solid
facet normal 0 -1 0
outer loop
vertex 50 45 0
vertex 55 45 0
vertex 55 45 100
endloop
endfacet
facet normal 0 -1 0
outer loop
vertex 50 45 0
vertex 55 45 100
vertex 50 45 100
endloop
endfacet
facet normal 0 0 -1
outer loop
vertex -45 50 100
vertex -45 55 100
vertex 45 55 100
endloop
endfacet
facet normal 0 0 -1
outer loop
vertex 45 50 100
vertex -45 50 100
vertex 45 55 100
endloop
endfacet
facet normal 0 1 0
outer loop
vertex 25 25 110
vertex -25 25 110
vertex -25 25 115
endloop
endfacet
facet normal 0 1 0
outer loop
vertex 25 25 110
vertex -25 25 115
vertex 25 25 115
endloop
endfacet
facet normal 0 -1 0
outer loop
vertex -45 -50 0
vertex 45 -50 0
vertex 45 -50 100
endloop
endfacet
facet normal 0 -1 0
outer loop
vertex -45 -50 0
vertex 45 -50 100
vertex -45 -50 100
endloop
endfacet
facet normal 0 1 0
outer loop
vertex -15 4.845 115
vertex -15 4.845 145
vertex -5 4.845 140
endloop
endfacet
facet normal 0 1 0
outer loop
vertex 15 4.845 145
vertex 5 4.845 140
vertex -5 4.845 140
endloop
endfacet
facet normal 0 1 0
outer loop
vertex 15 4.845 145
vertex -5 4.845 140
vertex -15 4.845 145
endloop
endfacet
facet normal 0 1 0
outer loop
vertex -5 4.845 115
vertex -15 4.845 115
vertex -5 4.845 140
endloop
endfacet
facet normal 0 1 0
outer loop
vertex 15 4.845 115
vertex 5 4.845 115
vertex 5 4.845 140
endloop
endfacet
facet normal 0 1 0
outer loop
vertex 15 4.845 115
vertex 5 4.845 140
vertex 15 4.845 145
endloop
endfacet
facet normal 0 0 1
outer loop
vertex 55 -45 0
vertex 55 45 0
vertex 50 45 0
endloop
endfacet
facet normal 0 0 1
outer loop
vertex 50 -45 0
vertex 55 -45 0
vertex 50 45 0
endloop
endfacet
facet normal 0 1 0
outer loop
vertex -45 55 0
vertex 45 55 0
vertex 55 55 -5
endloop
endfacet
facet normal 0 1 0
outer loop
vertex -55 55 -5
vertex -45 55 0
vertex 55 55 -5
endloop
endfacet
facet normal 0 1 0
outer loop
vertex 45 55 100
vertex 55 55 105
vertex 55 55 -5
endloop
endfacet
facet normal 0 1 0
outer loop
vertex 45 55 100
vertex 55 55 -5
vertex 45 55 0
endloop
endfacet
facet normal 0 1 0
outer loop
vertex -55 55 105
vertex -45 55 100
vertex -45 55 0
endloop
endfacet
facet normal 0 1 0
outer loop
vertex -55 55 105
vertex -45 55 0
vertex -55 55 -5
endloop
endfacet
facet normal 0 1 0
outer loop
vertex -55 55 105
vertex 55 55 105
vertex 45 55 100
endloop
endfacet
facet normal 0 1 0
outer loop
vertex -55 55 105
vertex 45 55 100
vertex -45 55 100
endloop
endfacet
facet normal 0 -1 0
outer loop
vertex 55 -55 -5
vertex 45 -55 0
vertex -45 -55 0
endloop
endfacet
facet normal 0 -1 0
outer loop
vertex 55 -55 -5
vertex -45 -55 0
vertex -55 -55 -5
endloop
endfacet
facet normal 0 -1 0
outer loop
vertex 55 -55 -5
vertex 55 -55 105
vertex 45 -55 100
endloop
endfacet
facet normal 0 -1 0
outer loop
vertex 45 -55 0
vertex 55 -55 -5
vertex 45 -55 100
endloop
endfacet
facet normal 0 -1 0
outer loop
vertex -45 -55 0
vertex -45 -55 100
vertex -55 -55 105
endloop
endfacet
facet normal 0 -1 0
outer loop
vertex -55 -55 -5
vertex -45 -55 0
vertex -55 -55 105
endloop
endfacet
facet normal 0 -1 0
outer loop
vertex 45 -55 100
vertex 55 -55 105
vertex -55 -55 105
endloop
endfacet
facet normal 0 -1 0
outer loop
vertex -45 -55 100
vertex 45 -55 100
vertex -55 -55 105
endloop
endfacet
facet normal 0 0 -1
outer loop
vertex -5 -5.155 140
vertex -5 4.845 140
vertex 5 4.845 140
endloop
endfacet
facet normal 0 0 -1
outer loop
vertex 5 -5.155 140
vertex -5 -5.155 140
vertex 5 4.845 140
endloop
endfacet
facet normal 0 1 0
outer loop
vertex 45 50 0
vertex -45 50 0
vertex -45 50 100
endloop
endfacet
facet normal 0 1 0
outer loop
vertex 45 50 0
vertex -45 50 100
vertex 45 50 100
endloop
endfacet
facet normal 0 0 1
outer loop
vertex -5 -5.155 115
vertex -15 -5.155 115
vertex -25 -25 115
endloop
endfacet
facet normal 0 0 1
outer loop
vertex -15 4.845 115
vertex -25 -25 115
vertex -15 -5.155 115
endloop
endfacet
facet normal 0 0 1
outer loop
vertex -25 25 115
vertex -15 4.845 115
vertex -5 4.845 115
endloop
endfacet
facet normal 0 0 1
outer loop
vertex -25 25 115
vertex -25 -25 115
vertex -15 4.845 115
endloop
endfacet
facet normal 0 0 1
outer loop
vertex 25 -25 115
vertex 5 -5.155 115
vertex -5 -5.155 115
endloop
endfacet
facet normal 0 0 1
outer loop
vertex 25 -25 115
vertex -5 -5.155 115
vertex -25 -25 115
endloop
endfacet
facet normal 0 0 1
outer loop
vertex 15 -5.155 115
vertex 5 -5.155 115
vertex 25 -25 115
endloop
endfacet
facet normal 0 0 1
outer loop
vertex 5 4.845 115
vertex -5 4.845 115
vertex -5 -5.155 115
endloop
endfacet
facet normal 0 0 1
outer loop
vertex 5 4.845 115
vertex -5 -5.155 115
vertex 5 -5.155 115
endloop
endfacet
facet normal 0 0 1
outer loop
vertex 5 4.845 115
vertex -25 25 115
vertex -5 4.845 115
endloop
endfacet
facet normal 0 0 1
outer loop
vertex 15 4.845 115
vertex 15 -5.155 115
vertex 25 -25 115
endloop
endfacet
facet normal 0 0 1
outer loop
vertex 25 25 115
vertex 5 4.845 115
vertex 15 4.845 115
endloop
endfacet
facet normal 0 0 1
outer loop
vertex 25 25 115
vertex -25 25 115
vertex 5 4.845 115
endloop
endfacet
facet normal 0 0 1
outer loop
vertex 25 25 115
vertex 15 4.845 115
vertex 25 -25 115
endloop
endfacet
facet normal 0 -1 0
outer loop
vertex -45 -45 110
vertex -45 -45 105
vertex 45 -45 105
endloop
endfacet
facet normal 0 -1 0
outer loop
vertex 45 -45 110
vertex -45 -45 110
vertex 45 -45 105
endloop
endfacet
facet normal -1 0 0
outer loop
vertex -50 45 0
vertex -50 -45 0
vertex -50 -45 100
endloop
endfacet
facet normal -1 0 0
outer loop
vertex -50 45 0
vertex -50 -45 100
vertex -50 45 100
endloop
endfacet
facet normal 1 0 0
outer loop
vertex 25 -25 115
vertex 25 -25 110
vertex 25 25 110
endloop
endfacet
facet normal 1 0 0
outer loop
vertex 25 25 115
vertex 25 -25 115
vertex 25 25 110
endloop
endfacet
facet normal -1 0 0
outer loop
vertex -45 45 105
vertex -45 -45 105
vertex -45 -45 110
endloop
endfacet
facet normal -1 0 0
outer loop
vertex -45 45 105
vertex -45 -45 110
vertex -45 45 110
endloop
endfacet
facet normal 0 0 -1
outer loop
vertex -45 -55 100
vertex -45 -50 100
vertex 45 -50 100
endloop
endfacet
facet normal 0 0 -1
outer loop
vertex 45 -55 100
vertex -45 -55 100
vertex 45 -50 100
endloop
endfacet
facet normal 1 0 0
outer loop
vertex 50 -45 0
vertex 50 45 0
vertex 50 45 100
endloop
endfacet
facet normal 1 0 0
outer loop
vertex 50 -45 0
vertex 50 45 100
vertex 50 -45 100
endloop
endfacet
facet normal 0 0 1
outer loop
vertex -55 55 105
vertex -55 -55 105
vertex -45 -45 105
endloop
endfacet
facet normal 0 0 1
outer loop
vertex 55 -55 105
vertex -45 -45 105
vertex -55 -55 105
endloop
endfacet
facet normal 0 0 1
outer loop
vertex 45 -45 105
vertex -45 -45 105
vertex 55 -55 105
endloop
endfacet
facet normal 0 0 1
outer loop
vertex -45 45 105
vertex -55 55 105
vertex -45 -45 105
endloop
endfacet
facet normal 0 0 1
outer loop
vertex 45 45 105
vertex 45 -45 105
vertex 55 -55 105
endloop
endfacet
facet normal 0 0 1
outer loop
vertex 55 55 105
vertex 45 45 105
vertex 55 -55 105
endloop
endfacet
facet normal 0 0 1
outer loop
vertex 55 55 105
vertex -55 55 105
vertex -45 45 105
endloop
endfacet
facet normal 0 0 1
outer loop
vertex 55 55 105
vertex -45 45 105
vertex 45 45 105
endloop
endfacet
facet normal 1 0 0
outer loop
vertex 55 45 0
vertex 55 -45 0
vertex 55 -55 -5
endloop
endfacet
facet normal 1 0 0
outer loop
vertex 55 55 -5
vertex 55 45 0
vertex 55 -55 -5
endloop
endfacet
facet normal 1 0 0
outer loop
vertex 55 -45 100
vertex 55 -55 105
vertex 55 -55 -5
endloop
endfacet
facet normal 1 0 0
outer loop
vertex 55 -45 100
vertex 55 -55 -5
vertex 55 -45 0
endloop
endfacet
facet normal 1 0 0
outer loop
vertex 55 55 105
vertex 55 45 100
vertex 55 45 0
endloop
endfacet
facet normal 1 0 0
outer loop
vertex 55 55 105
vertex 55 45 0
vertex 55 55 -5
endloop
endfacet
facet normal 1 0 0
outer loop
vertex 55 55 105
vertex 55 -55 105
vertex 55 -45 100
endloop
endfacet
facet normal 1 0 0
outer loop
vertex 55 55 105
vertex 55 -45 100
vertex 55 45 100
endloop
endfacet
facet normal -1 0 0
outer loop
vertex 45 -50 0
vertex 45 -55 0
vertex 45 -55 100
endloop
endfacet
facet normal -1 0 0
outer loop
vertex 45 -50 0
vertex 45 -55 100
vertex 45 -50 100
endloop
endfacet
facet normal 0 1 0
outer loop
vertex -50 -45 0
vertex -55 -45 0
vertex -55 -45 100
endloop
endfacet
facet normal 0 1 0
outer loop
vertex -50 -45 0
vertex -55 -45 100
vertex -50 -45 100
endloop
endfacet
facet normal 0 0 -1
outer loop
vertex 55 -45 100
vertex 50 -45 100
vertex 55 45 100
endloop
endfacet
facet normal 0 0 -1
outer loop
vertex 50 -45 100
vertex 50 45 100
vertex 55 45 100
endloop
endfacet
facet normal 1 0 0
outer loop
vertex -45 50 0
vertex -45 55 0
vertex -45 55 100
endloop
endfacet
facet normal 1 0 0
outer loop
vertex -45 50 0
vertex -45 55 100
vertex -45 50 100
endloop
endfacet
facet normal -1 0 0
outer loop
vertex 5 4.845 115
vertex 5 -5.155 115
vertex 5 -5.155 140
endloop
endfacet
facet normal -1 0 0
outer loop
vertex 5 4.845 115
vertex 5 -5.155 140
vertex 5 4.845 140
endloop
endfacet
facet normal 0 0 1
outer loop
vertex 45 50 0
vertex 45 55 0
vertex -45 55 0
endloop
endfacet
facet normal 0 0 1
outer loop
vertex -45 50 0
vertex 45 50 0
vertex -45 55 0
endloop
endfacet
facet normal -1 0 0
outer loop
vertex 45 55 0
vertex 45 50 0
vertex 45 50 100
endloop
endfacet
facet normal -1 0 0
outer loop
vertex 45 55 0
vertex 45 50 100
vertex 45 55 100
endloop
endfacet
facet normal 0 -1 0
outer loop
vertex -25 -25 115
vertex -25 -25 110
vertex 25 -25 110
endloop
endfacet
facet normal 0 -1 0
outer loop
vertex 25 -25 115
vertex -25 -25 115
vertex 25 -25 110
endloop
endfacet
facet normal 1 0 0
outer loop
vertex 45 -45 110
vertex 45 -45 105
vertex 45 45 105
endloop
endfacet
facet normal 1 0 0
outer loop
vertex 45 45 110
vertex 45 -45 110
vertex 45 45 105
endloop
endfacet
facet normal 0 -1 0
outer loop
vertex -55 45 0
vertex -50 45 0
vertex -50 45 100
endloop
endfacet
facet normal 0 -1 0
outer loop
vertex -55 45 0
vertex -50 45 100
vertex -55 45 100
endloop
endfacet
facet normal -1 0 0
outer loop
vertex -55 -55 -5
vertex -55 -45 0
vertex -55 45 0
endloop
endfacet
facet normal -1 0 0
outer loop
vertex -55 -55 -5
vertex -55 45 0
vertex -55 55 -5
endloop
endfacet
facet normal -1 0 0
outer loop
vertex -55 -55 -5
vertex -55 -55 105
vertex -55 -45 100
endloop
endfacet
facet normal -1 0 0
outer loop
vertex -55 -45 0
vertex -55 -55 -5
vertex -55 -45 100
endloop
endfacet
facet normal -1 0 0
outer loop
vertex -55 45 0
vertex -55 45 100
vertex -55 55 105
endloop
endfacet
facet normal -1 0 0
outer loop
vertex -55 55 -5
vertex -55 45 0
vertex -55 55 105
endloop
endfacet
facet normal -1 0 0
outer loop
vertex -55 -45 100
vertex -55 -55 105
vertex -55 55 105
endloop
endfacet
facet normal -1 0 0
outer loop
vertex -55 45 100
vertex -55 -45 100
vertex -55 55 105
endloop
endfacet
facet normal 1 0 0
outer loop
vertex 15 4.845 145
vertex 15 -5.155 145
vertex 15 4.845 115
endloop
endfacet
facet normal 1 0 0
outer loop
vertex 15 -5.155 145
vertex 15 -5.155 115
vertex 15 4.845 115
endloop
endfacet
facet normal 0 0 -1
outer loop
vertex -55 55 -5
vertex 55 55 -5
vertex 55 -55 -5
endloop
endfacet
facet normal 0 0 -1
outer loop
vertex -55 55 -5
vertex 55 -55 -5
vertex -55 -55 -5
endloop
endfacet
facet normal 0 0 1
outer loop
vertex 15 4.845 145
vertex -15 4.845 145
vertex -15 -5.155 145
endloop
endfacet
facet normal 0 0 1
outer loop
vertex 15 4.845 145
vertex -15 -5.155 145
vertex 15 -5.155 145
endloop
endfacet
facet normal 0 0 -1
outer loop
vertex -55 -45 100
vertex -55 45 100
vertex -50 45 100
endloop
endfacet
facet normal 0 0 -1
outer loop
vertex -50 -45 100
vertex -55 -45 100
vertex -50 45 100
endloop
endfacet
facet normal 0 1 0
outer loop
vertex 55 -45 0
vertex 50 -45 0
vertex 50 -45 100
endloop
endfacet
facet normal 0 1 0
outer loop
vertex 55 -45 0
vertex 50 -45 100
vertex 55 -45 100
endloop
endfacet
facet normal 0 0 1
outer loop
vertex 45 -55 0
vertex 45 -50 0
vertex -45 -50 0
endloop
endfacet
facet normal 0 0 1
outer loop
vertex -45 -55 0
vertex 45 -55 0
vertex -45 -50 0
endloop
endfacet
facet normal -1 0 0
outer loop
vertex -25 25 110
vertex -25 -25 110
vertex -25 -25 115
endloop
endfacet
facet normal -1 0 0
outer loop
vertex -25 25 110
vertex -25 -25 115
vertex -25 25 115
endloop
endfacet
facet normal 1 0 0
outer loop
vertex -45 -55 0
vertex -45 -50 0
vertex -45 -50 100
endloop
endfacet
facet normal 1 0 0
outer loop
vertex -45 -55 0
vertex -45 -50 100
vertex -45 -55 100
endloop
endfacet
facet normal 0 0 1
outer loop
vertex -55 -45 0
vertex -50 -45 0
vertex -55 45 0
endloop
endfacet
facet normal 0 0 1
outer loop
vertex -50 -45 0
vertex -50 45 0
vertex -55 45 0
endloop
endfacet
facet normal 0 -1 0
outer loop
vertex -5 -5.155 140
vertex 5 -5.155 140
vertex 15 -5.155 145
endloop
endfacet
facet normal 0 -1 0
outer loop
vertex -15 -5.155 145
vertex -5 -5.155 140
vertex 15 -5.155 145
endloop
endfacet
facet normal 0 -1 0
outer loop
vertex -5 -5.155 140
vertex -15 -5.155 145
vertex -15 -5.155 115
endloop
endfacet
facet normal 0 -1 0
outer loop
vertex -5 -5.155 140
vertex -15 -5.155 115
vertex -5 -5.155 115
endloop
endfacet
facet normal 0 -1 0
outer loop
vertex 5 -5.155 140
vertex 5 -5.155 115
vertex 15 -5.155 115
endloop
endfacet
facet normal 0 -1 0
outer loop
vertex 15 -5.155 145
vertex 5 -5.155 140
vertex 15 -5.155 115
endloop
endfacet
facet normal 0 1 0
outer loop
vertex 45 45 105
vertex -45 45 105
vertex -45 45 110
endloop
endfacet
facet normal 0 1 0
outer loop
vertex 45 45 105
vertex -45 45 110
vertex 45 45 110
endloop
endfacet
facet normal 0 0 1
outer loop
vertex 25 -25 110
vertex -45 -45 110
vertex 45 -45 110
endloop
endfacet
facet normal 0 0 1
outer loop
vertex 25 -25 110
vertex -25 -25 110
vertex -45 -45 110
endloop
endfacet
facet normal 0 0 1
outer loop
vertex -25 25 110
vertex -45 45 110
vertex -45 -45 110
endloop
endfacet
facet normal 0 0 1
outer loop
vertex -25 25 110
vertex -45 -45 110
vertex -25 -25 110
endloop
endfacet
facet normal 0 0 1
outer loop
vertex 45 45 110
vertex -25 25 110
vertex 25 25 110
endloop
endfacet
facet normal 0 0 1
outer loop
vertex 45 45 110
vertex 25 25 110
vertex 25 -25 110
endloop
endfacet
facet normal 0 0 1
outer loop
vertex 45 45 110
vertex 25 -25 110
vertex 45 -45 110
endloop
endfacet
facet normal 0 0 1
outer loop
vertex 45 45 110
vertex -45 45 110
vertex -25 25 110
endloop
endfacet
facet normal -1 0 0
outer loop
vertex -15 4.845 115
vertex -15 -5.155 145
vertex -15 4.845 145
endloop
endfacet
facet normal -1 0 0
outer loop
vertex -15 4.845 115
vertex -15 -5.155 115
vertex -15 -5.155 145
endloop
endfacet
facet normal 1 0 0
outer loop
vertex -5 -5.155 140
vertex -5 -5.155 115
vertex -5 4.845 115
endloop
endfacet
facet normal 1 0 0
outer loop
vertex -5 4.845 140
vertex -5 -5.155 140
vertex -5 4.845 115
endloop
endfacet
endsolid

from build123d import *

# Parameters (mm, degrees)
SALIENTE_EXTRUIR2_DEPTH = 100
CROQUIS2_W              = 110
CROQUIS2_H              = 110
SALIENTE_EXTRUIR3_DEPTH = 5
CROQUIS3_W              = 110
CROQUIS3_H              = 110
SALIENTE_EXTRUIR4_DEPTH = 5
CROQUIS4_W              = 90
CROQUIS4_H              = 90
SALIENTE_EXTRUIR5_DEPTH = 5
CROQUIS5_W              = 50
CROQUIS5_H              = 50
SALIENTE_EXTRUIR6_DEPTH = 5
CROQUIS6_W              = 10
CROQUIS6_H              = 10
SALIENTE_EXTRUIR7_DEPTH = 25
CROQUIS7_W              = 30
CROQUIS7_H              = 10
SALIENTE_EXTRUIR8_DEPTH = 5


with BuildPart() as part:
    # Croquis1 → Saliente-Extruir2 (new body)
    with BuildSketch(Plane.XY):
        Polygon((-45, 50), (45, 50), (45, 55), (55, 55), (55, 45), (50, 45), (50, -45), (55, -45), (55, -55), (45, -55), (45, -50), (-45, -50), (-45, -55), (-55, -55), (-55, -45), (-50, -45), (-50, 45), (-55, 45), (-55, 55), (-45, 55), align=None)
    extrude(amount=SALIENTE_EXTRUIR2_DEPTH)

    # Croquis2 → Saliente-Extruir3 (add)
    with BuildSketch(Plane.XY.offset(100)):
        Rectangle(CROQUIS2_W, CROQUIS2_H)
    extrude(amount=SALIENTE_EXTRUIR3_DEPTH)

    # Croquis3 → Saliente-Extruir4 (add)
    with BuildSketch(Plane(origin=(0, 0, 0), x_dir=(-1, 0, 0), z_dir=(0, 0, -1))):
        Rectangle(CROQUIS3_W, CROQUIS3_H)
    extrude(amount=SALIENTE_EXTRUIR4_DEPTH)

    # Croquis4 → Saliente-Extruir5 (add)
    with BuildSketch(Plane.XY.offset(105)):
        Rectangle(CROQUIS4_W, CROQUIS4_H)
    extrude(amount=SALIENTE_EXTRUIR5_DEPTH)

    # Croquis5 → Saliente-Extruir6 (add)
    with BuildSketch(Plane.XY.offset(110)):
        Rectangle(CROQUIS5_W, CROQUIS5_H)
    extrude(amount=SALIENTE_EXTRUIR6_DEPTH)

    # Croquis6 → Saliente-Extruir7 (add)
    with BuildSketch(Plane.XY.offset(115)):
        with Locations((-10, -0.15538451)):
            Rectangle(CROQUIS6_W, CROQUIS6_H)
        with Locations((10, -0.15538451)):
            Rectangle(CROQUIS6_W, CROQUIS6_H)
    extrude(amount=SALIENTE_EXTRUIR7_DEPTH)

    # Croquis7 → Saliente-Extruir8 (add)
    with BuildSketch(Plane.XY.offset(140)):
        with Locations((0, -0.15538451)):
            Rectangle(CROQUIS7_W, CROQUIS7_H)
    extrude(amount=SALIENTE_EXTRUIR8_DEPTH)


solid = part.part
